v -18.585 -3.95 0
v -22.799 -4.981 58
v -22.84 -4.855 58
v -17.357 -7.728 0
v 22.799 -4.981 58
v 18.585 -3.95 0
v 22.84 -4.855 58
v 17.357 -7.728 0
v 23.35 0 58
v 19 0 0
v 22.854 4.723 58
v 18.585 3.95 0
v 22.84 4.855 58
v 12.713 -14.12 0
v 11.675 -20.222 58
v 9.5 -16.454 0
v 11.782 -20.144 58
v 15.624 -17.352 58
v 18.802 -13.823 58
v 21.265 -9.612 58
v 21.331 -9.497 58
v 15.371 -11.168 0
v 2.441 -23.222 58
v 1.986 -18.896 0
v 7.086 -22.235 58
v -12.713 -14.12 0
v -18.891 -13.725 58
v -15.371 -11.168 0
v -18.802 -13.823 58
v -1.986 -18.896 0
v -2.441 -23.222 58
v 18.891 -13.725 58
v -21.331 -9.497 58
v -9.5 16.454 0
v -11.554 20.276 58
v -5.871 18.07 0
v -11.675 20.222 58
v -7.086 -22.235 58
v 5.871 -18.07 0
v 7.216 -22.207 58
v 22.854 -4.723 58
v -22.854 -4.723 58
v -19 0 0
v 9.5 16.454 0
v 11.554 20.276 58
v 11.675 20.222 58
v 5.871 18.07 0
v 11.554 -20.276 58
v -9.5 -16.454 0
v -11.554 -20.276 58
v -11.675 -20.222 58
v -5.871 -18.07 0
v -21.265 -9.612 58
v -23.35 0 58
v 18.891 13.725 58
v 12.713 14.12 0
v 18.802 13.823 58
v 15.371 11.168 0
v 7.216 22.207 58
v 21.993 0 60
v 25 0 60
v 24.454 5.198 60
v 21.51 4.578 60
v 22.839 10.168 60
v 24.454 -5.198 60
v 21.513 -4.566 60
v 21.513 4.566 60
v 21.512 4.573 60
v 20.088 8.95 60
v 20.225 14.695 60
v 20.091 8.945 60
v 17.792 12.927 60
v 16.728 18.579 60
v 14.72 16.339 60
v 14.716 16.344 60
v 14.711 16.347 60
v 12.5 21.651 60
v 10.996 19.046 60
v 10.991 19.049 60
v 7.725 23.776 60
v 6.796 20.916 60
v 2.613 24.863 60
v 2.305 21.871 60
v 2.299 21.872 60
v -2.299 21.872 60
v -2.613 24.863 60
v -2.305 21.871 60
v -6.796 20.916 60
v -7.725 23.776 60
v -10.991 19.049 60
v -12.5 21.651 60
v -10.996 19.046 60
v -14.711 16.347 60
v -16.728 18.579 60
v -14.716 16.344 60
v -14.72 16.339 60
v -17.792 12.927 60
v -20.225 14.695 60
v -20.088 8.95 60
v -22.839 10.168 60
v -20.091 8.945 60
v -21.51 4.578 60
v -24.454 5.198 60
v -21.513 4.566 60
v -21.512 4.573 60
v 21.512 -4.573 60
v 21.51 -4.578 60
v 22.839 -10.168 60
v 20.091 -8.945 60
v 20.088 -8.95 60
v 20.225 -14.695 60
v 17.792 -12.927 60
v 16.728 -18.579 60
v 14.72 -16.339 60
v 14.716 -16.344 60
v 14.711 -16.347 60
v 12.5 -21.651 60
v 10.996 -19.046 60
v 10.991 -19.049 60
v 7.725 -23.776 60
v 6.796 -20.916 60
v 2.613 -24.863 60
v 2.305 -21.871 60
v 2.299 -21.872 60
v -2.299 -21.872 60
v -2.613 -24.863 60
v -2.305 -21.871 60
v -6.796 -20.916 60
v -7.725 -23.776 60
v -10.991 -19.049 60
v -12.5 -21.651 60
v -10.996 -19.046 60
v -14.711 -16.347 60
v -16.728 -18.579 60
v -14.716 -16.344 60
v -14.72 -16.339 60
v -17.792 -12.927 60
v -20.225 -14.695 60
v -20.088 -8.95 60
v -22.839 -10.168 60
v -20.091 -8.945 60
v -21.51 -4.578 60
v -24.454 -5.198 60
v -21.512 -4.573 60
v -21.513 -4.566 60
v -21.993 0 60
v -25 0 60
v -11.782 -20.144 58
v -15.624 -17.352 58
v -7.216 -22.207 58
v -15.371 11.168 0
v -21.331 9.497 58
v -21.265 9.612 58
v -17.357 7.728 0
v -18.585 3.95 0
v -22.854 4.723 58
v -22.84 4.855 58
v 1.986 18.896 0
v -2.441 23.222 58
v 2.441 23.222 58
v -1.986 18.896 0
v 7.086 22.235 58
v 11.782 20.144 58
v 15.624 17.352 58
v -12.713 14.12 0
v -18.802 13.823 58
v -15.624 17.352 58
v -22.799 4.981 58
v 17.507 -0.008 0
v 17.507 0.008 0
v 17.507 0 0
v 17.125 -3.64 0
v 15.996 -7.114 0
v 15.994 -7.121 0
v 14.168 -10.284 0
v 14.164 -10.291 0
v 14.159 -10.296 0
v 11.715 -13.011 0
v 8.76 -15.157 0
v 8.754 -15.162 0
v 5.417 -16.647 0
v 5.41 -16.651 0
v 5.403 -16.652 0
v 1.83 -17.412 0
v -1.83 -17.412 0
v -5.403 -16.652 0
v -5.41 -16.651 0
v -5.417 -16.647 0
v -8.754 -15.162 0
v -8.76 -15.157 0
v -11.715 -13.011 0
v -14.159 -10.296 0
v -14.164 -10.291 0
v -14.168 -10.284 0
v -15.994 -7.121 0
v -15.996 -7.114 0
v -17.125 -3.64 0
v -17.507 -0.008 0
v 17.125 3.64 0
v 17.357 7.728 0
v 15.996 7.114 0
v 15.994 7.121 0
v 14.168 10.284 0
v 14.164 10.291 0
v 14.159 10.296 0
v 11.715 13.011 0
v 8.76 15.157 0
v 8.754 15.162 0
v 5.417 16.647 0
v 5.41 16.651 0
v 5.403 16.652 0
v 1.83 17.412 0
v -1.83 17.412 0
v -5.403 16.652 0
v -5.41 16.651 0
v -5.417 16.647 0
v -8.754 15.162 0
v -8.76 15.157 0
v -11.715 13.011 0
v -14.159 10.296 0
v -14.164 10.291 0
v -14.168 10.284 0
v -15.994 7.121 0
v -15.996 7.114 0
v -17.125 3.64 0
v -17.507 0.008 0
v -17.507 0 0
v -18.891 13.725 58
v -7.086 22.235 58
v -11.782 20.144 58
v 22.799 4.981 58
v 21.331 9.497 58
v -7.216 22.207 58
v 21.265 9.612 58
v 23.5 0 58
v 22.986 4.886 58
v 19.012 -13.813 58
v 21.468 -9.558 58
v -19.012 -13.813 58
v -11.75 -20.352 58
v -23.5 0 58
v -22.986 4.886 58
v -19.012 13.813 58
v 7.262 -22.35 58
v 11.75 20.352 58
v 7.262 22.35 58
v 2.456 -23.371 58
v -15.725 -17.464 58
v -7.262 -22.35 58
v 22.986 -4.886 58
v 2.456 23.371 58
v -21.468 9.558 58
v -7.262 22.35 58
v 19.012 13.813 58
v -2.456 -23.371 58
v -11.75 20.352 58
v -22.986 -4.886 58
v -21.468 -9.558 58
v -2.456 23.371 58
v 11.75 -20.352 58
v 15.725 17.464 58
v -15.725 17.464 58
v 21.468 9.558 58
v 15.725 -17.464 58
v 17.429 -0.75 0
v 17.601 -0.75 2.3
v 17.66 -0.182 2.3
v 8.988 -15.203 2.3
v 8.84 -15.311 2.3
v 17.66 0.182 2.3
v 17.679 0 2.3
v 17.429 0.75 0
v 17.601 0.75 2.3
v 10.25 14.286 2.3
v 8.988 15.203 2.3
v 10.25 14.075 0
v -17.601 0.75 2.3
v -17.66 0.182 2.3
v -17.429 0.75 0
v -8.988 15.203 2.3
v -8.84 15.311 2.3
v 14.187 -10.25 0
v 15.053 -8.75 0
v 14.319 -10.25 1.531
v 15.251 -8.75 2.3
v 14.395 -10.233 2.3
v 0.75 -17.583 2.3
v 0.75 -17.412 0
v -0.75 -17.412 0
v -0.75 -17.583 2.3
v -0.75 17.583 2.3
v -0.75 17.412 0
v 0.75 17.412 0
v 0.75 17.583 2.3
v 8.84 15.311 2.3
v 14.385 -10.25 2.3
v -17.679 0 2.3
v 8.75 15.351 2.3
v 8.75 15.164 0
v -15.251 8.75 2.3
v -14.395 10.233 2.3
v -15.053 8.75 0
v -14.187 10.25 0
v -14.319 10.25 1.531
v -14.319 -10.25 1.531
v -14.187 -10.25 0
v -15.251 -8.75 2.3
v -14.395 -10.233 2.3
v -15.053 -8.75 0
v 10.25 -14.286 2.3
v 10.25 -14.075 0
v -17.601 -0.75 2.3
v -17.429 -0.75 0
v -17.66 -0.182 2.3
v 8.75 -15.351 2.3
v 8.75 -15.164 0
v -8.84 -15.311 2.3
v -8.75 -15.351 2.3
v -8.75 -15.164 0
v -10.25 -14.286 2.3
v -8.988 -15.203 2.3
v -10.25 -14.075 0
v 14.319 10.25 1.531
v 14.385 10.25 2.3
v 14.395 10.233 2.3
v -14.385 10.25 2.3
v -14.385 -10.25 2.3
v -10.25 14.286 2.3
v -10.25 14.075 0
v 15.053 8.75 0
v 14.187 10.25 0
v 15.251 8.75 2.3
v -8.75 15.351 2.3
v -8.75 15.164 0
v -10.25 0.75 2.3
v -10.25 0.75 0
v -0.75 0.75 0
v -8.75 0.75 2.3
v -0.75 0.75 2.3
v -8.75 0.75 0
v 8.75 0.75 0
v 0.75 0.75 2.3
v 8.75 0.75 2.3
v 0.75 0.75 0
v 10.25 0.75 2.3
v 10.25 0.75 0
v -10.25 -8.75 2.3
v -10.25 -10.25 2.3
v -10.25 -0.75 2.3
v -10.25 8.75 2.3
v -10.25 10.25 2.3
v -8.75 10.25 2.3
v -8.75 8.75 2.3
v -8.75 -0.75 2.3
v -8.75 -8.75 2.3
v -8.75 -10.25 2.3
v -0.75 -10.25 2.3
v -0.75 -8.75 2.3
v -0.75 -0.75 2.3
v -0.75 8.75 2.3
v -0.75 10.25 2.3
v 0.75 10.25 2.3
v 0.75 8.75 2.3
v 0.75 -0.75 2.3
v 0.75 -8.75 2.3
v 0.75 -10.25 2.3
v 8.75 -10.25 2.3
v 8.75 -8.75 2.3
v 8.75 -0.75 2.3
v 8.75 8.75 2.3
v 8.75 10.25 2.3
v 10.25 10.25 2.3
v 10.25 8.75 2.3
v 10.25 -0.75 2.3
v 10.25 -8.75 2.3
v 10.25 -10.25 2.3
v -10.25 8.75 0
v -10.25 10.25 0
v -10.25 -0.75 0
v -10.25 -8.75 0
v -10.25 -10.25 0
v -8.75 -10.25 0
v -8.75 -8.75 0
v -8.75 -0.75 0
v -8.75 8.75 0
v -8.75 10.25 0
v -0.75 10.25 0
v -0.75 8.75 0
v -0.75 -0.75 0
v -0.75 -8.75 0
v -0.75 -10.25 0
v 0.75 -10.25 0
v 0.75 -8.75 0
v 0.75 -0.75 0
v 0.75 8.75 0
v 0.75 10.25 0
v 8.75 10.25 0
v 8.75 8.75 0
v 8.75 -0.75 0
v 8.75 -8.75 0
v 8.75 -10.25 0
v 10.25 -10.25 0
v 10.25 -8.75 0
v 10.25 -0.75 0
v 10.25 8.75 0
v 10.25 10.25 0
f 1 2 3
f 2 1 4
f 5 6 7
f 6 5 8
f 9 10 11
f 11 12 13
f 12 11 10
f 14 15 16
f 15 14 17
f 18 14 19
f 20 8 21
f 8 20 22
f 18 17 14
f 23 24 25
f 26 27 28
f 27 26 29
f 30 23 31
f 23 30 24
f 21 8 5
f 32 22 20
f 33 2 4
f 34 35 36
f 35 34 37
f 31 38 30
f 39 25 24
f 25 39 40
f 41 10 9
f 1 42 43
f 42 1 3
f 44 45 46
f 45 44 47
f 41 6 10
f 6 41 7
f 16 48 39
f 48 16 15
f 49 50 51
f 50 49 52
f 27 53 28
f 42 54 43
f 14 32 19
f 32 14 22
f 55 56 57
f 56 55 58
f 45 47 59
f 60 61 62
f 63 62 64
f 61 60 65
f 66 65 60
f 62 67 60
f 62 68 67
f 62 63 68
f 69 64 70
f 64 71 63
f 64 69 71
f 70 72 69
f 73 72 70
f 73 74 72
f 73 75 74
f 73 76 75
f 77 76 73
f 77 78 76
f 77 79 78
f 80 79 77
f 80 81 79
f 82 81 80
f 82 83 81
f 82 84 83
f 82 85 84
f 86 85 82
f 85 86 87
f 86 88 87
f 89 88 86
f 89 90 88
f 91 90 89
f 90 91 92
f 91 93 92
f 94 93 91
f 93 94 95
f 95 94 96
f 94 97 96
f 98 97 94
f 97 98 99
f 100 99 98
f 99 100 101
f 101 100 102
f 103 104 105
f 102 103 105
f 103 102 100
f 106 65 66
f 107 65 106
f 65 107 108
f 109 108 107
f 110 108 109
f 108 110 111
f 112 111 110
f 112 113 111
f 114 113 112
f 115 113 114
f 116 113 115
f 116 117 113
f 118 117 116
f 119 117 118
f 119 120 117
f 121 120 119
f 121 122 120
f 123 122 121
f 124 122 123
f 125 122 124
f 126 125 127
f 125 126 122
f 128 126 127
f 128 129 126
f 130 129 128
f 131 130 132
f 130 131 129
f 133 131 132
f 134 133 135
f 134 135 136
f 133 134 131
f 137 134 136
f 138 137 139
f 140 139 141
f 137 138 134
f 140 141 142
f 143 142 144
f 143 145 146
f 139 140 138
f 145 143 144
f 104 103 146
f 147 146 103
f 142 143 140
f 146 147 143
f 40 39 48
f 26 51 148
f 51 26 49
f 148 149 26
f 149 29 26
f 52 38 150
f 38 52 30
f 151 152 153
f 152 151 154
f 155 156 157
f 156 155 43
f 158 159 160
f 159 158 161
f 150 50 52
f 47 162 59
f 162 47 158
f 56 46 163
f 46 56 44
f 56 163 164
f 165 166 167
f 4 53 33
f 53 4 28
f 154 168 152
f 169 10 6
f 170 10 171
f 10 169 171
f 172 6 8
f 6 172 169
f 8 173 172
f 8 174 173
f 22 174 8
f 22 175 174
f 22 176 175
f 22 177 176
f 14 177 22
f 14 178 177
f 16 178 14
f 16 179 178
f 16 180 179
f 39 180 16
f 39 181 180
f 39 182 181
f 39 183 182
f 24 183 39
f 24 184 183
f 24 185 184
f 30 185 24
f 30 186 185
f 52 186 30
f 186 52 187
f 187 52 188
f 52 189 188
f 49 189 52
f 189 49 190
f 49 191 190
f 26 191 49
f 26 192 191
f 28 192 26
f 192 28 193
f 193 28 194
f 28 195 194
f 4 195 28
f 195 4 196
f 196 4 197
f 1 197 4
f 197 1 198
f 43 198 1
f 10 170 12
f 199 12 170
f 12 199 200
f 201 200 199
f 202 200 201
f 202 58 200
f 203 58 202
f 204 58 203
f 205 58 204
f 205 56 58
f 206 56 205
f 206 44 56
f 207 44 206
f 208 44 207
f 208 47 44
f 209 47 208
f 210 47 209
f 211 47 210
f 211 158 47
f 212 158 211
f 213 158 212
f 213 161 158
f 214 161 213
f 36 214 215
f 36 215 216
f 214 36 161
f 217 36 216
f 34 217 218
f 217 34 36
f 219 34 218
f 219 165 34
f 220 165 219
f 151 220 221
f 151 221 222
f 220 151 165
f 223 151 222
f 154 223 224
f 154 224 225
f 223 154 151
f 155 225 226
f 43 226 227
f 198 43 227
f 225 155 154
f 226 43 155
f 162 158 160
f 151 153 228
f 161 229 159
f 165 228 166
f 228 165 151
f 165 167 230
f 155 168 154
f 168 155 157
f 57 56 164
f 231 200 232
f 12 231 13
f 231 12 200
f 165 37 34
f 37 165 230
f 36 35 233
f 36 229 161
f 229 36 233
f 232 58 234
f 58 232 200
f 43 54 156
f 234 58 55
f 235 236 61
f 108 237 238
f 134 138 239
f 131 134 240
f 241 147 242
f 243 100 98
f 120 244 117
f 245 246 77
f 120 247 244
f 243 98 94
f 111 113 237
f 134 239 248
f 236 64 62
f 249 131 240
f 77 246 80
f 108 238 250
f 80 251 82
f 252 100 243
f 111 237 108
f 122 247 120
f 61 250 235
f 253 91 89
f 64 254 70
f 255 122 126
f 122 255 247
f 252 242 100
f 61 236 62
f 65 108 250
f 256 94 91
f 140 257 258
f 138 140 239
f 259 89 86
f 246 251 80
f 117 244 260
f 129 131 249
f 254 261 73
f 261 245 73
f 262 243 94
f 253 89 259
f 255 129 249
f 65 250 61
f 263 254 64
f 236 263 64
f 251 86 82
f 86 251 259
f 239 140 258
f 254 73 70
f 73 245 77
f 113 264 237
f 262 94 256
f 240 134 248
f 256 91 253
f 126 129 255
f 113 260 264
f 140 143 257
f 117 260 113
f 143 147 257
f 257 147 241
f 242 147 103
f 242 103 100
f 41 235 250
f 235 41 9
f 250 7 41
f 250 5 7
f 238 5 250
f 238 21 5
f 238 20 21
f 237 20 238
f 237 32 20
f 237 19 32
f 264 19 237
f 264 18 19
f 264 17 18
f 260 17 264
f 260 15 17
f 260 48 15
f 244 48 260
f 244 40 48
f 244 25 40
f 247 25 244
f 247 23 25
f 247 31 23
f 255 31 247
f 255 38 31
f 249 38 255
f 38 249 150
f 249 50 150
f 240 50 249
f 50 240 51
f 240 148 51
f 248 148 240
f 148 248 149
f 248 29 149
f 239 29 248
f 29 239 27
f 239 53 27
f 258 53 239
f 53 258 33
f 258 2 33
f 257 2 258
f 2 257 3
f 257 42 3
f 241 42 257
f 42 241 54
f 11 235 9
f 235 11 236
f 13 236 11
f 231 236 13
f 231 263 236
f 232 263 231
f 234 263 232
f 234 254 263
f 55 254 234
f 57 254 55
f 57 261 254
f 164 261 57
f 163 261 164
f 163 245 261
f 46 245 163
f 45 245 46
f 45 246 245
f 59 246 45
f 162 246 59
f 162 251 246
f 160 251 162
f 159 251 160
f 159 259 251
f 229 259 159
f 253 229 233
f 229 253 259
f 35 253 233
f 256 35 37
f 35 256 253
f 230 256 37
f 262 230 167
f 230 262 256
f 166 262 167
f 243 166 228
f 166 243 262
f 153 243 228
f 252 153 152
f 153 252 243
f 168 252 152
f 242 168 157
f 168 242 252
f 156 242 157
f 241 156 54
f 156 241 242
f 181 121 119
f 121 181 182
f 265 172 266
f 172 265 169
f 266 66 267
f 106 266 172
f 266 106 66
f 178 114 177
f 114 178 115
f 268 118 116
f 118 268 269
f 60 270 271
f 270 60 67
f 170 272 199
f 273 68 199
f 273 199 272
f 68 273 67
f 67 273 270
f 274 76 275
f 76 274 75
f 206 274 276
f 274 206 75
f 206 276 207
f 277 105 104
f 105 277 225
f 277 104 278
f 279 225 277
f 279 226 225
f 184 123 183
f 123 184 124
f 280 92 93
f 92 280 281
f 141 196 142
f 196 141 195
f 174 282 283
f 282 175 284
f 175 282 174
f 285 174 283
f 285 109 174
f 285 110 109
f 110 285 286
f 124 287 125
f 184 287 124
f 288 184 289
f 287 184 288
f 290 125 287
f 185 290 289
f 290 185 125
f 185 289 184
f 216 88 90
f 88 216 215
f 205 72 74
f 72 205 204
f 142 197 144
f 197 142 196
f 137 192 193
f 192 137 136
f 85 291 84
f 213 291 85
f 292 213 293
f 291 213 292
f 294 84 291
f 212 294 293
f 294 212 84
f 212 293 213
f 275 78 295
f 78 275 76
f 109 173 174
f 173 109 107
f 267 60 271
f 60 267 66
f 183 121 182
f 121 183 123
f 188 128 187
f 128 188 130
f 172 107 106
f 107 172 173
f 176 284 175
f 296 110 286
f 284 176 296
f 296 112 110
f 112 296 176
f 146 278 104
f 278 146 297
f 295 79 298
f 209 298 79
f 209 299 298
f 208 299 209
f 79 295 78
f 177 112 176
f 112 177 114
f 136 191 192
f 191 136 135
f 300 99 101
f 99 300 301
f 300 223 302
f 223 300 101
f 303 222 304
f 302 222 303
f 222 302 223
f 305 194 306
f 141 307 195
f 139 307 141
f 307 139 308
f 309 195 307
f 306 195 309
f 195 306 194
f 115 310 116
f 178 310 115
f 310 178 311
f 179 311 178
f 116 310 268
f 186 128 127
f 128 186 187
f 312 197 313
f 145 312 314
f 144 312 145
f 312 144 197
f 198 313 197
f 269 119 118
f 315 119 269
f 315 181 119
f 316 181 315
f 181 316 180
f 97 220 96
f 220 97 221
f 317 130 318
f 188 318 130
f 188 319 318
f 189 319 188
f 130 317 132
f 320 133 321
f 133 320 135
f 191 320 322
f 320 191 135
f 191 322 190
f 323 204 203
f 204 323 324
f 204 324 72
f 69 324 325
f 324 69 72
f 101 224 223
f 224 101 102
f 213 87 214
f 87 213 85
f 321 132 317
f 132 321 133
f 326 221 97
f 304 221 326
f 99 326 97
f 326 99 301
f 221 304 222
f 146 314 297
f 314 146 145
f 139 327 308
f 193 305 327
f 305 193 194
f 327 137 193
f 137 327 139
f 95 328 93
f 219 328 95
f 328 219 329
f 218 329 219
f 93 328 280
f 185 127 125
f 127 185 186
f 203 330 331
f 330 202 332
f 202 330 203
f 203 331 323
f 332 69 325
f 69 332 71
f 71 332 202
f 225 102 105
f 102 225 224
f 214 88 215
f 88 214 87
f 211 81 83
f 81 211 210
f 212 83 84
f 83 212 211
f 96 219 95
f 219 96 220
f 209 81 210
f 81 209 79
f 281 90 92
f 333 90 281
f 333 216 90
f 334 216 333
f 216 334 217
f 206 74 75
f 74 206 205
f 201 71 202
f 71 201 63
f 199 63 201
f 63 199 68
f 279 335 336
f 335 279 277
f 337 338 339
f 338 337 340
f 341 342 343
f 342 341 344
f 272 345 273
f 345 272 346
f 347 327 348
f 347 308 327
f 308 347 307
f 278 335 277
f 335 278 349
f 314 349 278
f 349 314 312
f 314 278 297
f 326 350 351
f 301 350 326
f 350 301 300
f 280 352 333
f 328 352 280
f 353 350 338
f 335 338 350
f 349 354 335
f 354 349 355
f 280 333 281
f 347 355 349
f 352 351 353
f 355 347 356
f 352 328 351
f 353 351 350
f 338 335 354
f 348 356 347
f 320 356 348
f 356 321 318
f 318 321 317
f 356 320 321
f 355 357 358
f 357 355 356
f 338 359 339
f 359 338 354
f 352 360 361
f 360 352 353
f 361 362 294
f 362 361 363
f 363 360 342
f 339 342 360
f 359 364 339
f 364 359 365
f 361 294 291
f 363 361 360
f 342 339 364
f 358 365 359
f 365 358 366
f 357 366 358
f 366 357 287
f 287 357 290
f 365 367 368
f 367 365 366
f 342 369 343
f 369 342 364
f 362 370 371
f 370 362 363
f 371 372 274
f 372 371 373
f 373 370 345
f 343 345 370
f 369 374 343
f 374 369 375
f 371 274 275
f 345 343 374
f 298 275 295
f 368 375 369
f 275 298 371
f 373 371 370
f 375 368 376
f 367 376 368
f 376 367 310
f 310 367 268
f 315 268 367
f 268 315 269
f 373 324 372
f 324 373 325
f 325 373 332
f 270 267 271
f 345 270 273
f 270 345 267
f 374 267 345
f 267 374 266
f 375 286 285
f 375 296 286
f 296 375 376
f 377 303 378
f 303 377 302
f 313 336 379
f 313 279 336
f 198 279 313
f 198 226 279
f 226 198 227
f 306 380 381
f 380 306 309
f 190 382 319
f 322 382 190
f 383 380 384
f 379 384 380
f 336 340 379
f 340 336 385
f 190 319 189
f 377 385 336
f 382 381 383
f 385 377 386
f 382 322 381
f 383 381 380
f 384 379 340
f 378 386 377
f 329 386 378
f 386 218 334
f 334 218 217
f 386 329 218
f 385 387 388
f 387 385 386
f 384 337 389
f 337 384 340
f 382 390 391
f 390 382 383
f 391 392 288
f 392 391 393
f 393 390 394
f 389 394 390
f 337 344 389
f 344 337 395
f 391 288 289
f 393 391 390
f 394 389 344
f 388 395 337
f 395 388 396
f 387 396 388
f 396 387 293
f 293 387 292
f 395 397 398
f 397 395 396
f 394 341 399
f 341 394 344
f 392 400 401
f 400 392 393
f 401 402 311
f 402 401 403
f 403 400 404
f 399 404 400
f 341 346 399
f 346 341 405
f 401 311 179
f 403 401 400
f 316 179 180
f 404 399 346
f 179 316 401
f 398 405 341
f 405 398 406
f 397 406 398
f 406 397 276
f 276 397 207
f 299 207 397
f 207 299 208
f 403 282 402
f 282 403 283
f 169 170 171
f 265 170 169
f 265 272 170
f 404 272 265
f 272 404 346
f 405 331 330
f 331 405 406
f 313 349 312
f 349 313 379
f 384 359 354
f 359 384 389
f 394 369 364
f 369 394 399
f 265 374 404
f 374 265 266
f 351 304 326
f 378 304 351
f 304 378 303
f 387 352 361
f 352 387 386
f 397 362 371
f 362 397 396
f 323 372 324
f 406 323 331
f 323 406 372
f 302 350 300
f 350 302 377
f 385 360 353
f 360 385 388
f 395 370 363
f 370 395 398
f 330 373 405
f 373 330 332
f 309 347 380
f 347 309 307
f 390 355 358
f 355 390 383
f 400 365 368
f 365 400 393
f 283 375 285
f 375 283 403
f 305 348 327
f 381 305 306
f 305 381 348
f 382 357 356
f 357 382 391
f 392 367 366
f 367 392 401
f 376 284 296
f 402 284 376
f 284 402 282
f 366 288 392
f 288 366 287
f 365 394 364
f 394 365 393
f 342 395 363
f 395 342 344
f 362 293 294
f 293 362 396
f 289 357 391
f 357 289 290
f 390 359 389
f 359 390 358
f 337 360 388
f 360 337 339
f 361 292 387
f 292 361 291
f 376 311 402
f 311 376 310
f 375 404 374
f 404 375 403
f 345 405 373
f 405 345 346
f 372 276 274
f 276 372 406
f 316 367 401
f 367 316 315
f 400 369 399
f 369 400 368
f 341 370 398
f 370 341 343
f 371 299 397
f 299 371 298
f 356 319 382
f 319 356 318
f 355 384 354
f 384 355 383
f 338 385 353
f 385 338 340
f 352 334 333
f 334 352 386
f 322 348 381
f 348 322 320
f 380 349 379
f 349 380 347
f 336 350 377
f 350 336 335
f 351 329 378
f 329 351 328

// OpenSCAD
// Parametric hydroponic cup (C)2012 vik@diamondage.co.nz

cup_top_rad = 47 / 2;
cup_wall = 1.5;
cup_bottom_rad = 38 / 2;
cup_height = 60;
grid_ht = 2.3;

difference()
{
    union()
    {
        cylinder(h = cup_height, r1 = cup_bottom_rad, r2 = cup_top_rad);
        // Rim
        translate([ 0, 0, cup_height - 2 ]) cylinder(h = 2, r2 = cup_top_rad + cup_wall, r1 = cup_top_rad);
    }
    translate([ 0, 0, -0.1 ])
        cylinder(h = cup_height + 0.2, r1 = cup_bottom_rad - cup_wall, r2 = cup_top_rad - cup_wall);
}

// grid for base.
translate([ 0, 0, grid_ht / 2 ]) intersection()
{
    union()
    {
        cube([ cup_wall, cup_bottom_rad * 2, grid_ht ], center = true);
        translate([ cup_bottom_rad * .5, 0, 0 ]) cube([ cup_wall, cup_bottom_rad * 2, grid_ht ], center = true);
        translate([ cup_bottom_rad * -.5, 0, 0 ]) cube([ cup_wall, cup_bottom_rad * 2, grid_ht ], center = true);

        rotate([ 0, 0, 90 ])
        {
            cube([ cup_wall, cup_bottom_rad * 2, grid_ht ], center = true);
            translate([ cup_bottom_rad * .5, 0, 0 ]) cube([ cup_wall, cup_bottom_rad * 2, grid_ht ], center = true);
            translate([ cup_bottom_rad * -.5, 0, 0 ]) cube([ cup_wall, cup_bottom_rad * 2, grid_ht ], center = true);
        }
    }
    translate([ 0, 0, -grid_ht ]) cylinder(h = 3 * grid_ht, r = cup_bottom_rad - cup_wall / 2);
}
